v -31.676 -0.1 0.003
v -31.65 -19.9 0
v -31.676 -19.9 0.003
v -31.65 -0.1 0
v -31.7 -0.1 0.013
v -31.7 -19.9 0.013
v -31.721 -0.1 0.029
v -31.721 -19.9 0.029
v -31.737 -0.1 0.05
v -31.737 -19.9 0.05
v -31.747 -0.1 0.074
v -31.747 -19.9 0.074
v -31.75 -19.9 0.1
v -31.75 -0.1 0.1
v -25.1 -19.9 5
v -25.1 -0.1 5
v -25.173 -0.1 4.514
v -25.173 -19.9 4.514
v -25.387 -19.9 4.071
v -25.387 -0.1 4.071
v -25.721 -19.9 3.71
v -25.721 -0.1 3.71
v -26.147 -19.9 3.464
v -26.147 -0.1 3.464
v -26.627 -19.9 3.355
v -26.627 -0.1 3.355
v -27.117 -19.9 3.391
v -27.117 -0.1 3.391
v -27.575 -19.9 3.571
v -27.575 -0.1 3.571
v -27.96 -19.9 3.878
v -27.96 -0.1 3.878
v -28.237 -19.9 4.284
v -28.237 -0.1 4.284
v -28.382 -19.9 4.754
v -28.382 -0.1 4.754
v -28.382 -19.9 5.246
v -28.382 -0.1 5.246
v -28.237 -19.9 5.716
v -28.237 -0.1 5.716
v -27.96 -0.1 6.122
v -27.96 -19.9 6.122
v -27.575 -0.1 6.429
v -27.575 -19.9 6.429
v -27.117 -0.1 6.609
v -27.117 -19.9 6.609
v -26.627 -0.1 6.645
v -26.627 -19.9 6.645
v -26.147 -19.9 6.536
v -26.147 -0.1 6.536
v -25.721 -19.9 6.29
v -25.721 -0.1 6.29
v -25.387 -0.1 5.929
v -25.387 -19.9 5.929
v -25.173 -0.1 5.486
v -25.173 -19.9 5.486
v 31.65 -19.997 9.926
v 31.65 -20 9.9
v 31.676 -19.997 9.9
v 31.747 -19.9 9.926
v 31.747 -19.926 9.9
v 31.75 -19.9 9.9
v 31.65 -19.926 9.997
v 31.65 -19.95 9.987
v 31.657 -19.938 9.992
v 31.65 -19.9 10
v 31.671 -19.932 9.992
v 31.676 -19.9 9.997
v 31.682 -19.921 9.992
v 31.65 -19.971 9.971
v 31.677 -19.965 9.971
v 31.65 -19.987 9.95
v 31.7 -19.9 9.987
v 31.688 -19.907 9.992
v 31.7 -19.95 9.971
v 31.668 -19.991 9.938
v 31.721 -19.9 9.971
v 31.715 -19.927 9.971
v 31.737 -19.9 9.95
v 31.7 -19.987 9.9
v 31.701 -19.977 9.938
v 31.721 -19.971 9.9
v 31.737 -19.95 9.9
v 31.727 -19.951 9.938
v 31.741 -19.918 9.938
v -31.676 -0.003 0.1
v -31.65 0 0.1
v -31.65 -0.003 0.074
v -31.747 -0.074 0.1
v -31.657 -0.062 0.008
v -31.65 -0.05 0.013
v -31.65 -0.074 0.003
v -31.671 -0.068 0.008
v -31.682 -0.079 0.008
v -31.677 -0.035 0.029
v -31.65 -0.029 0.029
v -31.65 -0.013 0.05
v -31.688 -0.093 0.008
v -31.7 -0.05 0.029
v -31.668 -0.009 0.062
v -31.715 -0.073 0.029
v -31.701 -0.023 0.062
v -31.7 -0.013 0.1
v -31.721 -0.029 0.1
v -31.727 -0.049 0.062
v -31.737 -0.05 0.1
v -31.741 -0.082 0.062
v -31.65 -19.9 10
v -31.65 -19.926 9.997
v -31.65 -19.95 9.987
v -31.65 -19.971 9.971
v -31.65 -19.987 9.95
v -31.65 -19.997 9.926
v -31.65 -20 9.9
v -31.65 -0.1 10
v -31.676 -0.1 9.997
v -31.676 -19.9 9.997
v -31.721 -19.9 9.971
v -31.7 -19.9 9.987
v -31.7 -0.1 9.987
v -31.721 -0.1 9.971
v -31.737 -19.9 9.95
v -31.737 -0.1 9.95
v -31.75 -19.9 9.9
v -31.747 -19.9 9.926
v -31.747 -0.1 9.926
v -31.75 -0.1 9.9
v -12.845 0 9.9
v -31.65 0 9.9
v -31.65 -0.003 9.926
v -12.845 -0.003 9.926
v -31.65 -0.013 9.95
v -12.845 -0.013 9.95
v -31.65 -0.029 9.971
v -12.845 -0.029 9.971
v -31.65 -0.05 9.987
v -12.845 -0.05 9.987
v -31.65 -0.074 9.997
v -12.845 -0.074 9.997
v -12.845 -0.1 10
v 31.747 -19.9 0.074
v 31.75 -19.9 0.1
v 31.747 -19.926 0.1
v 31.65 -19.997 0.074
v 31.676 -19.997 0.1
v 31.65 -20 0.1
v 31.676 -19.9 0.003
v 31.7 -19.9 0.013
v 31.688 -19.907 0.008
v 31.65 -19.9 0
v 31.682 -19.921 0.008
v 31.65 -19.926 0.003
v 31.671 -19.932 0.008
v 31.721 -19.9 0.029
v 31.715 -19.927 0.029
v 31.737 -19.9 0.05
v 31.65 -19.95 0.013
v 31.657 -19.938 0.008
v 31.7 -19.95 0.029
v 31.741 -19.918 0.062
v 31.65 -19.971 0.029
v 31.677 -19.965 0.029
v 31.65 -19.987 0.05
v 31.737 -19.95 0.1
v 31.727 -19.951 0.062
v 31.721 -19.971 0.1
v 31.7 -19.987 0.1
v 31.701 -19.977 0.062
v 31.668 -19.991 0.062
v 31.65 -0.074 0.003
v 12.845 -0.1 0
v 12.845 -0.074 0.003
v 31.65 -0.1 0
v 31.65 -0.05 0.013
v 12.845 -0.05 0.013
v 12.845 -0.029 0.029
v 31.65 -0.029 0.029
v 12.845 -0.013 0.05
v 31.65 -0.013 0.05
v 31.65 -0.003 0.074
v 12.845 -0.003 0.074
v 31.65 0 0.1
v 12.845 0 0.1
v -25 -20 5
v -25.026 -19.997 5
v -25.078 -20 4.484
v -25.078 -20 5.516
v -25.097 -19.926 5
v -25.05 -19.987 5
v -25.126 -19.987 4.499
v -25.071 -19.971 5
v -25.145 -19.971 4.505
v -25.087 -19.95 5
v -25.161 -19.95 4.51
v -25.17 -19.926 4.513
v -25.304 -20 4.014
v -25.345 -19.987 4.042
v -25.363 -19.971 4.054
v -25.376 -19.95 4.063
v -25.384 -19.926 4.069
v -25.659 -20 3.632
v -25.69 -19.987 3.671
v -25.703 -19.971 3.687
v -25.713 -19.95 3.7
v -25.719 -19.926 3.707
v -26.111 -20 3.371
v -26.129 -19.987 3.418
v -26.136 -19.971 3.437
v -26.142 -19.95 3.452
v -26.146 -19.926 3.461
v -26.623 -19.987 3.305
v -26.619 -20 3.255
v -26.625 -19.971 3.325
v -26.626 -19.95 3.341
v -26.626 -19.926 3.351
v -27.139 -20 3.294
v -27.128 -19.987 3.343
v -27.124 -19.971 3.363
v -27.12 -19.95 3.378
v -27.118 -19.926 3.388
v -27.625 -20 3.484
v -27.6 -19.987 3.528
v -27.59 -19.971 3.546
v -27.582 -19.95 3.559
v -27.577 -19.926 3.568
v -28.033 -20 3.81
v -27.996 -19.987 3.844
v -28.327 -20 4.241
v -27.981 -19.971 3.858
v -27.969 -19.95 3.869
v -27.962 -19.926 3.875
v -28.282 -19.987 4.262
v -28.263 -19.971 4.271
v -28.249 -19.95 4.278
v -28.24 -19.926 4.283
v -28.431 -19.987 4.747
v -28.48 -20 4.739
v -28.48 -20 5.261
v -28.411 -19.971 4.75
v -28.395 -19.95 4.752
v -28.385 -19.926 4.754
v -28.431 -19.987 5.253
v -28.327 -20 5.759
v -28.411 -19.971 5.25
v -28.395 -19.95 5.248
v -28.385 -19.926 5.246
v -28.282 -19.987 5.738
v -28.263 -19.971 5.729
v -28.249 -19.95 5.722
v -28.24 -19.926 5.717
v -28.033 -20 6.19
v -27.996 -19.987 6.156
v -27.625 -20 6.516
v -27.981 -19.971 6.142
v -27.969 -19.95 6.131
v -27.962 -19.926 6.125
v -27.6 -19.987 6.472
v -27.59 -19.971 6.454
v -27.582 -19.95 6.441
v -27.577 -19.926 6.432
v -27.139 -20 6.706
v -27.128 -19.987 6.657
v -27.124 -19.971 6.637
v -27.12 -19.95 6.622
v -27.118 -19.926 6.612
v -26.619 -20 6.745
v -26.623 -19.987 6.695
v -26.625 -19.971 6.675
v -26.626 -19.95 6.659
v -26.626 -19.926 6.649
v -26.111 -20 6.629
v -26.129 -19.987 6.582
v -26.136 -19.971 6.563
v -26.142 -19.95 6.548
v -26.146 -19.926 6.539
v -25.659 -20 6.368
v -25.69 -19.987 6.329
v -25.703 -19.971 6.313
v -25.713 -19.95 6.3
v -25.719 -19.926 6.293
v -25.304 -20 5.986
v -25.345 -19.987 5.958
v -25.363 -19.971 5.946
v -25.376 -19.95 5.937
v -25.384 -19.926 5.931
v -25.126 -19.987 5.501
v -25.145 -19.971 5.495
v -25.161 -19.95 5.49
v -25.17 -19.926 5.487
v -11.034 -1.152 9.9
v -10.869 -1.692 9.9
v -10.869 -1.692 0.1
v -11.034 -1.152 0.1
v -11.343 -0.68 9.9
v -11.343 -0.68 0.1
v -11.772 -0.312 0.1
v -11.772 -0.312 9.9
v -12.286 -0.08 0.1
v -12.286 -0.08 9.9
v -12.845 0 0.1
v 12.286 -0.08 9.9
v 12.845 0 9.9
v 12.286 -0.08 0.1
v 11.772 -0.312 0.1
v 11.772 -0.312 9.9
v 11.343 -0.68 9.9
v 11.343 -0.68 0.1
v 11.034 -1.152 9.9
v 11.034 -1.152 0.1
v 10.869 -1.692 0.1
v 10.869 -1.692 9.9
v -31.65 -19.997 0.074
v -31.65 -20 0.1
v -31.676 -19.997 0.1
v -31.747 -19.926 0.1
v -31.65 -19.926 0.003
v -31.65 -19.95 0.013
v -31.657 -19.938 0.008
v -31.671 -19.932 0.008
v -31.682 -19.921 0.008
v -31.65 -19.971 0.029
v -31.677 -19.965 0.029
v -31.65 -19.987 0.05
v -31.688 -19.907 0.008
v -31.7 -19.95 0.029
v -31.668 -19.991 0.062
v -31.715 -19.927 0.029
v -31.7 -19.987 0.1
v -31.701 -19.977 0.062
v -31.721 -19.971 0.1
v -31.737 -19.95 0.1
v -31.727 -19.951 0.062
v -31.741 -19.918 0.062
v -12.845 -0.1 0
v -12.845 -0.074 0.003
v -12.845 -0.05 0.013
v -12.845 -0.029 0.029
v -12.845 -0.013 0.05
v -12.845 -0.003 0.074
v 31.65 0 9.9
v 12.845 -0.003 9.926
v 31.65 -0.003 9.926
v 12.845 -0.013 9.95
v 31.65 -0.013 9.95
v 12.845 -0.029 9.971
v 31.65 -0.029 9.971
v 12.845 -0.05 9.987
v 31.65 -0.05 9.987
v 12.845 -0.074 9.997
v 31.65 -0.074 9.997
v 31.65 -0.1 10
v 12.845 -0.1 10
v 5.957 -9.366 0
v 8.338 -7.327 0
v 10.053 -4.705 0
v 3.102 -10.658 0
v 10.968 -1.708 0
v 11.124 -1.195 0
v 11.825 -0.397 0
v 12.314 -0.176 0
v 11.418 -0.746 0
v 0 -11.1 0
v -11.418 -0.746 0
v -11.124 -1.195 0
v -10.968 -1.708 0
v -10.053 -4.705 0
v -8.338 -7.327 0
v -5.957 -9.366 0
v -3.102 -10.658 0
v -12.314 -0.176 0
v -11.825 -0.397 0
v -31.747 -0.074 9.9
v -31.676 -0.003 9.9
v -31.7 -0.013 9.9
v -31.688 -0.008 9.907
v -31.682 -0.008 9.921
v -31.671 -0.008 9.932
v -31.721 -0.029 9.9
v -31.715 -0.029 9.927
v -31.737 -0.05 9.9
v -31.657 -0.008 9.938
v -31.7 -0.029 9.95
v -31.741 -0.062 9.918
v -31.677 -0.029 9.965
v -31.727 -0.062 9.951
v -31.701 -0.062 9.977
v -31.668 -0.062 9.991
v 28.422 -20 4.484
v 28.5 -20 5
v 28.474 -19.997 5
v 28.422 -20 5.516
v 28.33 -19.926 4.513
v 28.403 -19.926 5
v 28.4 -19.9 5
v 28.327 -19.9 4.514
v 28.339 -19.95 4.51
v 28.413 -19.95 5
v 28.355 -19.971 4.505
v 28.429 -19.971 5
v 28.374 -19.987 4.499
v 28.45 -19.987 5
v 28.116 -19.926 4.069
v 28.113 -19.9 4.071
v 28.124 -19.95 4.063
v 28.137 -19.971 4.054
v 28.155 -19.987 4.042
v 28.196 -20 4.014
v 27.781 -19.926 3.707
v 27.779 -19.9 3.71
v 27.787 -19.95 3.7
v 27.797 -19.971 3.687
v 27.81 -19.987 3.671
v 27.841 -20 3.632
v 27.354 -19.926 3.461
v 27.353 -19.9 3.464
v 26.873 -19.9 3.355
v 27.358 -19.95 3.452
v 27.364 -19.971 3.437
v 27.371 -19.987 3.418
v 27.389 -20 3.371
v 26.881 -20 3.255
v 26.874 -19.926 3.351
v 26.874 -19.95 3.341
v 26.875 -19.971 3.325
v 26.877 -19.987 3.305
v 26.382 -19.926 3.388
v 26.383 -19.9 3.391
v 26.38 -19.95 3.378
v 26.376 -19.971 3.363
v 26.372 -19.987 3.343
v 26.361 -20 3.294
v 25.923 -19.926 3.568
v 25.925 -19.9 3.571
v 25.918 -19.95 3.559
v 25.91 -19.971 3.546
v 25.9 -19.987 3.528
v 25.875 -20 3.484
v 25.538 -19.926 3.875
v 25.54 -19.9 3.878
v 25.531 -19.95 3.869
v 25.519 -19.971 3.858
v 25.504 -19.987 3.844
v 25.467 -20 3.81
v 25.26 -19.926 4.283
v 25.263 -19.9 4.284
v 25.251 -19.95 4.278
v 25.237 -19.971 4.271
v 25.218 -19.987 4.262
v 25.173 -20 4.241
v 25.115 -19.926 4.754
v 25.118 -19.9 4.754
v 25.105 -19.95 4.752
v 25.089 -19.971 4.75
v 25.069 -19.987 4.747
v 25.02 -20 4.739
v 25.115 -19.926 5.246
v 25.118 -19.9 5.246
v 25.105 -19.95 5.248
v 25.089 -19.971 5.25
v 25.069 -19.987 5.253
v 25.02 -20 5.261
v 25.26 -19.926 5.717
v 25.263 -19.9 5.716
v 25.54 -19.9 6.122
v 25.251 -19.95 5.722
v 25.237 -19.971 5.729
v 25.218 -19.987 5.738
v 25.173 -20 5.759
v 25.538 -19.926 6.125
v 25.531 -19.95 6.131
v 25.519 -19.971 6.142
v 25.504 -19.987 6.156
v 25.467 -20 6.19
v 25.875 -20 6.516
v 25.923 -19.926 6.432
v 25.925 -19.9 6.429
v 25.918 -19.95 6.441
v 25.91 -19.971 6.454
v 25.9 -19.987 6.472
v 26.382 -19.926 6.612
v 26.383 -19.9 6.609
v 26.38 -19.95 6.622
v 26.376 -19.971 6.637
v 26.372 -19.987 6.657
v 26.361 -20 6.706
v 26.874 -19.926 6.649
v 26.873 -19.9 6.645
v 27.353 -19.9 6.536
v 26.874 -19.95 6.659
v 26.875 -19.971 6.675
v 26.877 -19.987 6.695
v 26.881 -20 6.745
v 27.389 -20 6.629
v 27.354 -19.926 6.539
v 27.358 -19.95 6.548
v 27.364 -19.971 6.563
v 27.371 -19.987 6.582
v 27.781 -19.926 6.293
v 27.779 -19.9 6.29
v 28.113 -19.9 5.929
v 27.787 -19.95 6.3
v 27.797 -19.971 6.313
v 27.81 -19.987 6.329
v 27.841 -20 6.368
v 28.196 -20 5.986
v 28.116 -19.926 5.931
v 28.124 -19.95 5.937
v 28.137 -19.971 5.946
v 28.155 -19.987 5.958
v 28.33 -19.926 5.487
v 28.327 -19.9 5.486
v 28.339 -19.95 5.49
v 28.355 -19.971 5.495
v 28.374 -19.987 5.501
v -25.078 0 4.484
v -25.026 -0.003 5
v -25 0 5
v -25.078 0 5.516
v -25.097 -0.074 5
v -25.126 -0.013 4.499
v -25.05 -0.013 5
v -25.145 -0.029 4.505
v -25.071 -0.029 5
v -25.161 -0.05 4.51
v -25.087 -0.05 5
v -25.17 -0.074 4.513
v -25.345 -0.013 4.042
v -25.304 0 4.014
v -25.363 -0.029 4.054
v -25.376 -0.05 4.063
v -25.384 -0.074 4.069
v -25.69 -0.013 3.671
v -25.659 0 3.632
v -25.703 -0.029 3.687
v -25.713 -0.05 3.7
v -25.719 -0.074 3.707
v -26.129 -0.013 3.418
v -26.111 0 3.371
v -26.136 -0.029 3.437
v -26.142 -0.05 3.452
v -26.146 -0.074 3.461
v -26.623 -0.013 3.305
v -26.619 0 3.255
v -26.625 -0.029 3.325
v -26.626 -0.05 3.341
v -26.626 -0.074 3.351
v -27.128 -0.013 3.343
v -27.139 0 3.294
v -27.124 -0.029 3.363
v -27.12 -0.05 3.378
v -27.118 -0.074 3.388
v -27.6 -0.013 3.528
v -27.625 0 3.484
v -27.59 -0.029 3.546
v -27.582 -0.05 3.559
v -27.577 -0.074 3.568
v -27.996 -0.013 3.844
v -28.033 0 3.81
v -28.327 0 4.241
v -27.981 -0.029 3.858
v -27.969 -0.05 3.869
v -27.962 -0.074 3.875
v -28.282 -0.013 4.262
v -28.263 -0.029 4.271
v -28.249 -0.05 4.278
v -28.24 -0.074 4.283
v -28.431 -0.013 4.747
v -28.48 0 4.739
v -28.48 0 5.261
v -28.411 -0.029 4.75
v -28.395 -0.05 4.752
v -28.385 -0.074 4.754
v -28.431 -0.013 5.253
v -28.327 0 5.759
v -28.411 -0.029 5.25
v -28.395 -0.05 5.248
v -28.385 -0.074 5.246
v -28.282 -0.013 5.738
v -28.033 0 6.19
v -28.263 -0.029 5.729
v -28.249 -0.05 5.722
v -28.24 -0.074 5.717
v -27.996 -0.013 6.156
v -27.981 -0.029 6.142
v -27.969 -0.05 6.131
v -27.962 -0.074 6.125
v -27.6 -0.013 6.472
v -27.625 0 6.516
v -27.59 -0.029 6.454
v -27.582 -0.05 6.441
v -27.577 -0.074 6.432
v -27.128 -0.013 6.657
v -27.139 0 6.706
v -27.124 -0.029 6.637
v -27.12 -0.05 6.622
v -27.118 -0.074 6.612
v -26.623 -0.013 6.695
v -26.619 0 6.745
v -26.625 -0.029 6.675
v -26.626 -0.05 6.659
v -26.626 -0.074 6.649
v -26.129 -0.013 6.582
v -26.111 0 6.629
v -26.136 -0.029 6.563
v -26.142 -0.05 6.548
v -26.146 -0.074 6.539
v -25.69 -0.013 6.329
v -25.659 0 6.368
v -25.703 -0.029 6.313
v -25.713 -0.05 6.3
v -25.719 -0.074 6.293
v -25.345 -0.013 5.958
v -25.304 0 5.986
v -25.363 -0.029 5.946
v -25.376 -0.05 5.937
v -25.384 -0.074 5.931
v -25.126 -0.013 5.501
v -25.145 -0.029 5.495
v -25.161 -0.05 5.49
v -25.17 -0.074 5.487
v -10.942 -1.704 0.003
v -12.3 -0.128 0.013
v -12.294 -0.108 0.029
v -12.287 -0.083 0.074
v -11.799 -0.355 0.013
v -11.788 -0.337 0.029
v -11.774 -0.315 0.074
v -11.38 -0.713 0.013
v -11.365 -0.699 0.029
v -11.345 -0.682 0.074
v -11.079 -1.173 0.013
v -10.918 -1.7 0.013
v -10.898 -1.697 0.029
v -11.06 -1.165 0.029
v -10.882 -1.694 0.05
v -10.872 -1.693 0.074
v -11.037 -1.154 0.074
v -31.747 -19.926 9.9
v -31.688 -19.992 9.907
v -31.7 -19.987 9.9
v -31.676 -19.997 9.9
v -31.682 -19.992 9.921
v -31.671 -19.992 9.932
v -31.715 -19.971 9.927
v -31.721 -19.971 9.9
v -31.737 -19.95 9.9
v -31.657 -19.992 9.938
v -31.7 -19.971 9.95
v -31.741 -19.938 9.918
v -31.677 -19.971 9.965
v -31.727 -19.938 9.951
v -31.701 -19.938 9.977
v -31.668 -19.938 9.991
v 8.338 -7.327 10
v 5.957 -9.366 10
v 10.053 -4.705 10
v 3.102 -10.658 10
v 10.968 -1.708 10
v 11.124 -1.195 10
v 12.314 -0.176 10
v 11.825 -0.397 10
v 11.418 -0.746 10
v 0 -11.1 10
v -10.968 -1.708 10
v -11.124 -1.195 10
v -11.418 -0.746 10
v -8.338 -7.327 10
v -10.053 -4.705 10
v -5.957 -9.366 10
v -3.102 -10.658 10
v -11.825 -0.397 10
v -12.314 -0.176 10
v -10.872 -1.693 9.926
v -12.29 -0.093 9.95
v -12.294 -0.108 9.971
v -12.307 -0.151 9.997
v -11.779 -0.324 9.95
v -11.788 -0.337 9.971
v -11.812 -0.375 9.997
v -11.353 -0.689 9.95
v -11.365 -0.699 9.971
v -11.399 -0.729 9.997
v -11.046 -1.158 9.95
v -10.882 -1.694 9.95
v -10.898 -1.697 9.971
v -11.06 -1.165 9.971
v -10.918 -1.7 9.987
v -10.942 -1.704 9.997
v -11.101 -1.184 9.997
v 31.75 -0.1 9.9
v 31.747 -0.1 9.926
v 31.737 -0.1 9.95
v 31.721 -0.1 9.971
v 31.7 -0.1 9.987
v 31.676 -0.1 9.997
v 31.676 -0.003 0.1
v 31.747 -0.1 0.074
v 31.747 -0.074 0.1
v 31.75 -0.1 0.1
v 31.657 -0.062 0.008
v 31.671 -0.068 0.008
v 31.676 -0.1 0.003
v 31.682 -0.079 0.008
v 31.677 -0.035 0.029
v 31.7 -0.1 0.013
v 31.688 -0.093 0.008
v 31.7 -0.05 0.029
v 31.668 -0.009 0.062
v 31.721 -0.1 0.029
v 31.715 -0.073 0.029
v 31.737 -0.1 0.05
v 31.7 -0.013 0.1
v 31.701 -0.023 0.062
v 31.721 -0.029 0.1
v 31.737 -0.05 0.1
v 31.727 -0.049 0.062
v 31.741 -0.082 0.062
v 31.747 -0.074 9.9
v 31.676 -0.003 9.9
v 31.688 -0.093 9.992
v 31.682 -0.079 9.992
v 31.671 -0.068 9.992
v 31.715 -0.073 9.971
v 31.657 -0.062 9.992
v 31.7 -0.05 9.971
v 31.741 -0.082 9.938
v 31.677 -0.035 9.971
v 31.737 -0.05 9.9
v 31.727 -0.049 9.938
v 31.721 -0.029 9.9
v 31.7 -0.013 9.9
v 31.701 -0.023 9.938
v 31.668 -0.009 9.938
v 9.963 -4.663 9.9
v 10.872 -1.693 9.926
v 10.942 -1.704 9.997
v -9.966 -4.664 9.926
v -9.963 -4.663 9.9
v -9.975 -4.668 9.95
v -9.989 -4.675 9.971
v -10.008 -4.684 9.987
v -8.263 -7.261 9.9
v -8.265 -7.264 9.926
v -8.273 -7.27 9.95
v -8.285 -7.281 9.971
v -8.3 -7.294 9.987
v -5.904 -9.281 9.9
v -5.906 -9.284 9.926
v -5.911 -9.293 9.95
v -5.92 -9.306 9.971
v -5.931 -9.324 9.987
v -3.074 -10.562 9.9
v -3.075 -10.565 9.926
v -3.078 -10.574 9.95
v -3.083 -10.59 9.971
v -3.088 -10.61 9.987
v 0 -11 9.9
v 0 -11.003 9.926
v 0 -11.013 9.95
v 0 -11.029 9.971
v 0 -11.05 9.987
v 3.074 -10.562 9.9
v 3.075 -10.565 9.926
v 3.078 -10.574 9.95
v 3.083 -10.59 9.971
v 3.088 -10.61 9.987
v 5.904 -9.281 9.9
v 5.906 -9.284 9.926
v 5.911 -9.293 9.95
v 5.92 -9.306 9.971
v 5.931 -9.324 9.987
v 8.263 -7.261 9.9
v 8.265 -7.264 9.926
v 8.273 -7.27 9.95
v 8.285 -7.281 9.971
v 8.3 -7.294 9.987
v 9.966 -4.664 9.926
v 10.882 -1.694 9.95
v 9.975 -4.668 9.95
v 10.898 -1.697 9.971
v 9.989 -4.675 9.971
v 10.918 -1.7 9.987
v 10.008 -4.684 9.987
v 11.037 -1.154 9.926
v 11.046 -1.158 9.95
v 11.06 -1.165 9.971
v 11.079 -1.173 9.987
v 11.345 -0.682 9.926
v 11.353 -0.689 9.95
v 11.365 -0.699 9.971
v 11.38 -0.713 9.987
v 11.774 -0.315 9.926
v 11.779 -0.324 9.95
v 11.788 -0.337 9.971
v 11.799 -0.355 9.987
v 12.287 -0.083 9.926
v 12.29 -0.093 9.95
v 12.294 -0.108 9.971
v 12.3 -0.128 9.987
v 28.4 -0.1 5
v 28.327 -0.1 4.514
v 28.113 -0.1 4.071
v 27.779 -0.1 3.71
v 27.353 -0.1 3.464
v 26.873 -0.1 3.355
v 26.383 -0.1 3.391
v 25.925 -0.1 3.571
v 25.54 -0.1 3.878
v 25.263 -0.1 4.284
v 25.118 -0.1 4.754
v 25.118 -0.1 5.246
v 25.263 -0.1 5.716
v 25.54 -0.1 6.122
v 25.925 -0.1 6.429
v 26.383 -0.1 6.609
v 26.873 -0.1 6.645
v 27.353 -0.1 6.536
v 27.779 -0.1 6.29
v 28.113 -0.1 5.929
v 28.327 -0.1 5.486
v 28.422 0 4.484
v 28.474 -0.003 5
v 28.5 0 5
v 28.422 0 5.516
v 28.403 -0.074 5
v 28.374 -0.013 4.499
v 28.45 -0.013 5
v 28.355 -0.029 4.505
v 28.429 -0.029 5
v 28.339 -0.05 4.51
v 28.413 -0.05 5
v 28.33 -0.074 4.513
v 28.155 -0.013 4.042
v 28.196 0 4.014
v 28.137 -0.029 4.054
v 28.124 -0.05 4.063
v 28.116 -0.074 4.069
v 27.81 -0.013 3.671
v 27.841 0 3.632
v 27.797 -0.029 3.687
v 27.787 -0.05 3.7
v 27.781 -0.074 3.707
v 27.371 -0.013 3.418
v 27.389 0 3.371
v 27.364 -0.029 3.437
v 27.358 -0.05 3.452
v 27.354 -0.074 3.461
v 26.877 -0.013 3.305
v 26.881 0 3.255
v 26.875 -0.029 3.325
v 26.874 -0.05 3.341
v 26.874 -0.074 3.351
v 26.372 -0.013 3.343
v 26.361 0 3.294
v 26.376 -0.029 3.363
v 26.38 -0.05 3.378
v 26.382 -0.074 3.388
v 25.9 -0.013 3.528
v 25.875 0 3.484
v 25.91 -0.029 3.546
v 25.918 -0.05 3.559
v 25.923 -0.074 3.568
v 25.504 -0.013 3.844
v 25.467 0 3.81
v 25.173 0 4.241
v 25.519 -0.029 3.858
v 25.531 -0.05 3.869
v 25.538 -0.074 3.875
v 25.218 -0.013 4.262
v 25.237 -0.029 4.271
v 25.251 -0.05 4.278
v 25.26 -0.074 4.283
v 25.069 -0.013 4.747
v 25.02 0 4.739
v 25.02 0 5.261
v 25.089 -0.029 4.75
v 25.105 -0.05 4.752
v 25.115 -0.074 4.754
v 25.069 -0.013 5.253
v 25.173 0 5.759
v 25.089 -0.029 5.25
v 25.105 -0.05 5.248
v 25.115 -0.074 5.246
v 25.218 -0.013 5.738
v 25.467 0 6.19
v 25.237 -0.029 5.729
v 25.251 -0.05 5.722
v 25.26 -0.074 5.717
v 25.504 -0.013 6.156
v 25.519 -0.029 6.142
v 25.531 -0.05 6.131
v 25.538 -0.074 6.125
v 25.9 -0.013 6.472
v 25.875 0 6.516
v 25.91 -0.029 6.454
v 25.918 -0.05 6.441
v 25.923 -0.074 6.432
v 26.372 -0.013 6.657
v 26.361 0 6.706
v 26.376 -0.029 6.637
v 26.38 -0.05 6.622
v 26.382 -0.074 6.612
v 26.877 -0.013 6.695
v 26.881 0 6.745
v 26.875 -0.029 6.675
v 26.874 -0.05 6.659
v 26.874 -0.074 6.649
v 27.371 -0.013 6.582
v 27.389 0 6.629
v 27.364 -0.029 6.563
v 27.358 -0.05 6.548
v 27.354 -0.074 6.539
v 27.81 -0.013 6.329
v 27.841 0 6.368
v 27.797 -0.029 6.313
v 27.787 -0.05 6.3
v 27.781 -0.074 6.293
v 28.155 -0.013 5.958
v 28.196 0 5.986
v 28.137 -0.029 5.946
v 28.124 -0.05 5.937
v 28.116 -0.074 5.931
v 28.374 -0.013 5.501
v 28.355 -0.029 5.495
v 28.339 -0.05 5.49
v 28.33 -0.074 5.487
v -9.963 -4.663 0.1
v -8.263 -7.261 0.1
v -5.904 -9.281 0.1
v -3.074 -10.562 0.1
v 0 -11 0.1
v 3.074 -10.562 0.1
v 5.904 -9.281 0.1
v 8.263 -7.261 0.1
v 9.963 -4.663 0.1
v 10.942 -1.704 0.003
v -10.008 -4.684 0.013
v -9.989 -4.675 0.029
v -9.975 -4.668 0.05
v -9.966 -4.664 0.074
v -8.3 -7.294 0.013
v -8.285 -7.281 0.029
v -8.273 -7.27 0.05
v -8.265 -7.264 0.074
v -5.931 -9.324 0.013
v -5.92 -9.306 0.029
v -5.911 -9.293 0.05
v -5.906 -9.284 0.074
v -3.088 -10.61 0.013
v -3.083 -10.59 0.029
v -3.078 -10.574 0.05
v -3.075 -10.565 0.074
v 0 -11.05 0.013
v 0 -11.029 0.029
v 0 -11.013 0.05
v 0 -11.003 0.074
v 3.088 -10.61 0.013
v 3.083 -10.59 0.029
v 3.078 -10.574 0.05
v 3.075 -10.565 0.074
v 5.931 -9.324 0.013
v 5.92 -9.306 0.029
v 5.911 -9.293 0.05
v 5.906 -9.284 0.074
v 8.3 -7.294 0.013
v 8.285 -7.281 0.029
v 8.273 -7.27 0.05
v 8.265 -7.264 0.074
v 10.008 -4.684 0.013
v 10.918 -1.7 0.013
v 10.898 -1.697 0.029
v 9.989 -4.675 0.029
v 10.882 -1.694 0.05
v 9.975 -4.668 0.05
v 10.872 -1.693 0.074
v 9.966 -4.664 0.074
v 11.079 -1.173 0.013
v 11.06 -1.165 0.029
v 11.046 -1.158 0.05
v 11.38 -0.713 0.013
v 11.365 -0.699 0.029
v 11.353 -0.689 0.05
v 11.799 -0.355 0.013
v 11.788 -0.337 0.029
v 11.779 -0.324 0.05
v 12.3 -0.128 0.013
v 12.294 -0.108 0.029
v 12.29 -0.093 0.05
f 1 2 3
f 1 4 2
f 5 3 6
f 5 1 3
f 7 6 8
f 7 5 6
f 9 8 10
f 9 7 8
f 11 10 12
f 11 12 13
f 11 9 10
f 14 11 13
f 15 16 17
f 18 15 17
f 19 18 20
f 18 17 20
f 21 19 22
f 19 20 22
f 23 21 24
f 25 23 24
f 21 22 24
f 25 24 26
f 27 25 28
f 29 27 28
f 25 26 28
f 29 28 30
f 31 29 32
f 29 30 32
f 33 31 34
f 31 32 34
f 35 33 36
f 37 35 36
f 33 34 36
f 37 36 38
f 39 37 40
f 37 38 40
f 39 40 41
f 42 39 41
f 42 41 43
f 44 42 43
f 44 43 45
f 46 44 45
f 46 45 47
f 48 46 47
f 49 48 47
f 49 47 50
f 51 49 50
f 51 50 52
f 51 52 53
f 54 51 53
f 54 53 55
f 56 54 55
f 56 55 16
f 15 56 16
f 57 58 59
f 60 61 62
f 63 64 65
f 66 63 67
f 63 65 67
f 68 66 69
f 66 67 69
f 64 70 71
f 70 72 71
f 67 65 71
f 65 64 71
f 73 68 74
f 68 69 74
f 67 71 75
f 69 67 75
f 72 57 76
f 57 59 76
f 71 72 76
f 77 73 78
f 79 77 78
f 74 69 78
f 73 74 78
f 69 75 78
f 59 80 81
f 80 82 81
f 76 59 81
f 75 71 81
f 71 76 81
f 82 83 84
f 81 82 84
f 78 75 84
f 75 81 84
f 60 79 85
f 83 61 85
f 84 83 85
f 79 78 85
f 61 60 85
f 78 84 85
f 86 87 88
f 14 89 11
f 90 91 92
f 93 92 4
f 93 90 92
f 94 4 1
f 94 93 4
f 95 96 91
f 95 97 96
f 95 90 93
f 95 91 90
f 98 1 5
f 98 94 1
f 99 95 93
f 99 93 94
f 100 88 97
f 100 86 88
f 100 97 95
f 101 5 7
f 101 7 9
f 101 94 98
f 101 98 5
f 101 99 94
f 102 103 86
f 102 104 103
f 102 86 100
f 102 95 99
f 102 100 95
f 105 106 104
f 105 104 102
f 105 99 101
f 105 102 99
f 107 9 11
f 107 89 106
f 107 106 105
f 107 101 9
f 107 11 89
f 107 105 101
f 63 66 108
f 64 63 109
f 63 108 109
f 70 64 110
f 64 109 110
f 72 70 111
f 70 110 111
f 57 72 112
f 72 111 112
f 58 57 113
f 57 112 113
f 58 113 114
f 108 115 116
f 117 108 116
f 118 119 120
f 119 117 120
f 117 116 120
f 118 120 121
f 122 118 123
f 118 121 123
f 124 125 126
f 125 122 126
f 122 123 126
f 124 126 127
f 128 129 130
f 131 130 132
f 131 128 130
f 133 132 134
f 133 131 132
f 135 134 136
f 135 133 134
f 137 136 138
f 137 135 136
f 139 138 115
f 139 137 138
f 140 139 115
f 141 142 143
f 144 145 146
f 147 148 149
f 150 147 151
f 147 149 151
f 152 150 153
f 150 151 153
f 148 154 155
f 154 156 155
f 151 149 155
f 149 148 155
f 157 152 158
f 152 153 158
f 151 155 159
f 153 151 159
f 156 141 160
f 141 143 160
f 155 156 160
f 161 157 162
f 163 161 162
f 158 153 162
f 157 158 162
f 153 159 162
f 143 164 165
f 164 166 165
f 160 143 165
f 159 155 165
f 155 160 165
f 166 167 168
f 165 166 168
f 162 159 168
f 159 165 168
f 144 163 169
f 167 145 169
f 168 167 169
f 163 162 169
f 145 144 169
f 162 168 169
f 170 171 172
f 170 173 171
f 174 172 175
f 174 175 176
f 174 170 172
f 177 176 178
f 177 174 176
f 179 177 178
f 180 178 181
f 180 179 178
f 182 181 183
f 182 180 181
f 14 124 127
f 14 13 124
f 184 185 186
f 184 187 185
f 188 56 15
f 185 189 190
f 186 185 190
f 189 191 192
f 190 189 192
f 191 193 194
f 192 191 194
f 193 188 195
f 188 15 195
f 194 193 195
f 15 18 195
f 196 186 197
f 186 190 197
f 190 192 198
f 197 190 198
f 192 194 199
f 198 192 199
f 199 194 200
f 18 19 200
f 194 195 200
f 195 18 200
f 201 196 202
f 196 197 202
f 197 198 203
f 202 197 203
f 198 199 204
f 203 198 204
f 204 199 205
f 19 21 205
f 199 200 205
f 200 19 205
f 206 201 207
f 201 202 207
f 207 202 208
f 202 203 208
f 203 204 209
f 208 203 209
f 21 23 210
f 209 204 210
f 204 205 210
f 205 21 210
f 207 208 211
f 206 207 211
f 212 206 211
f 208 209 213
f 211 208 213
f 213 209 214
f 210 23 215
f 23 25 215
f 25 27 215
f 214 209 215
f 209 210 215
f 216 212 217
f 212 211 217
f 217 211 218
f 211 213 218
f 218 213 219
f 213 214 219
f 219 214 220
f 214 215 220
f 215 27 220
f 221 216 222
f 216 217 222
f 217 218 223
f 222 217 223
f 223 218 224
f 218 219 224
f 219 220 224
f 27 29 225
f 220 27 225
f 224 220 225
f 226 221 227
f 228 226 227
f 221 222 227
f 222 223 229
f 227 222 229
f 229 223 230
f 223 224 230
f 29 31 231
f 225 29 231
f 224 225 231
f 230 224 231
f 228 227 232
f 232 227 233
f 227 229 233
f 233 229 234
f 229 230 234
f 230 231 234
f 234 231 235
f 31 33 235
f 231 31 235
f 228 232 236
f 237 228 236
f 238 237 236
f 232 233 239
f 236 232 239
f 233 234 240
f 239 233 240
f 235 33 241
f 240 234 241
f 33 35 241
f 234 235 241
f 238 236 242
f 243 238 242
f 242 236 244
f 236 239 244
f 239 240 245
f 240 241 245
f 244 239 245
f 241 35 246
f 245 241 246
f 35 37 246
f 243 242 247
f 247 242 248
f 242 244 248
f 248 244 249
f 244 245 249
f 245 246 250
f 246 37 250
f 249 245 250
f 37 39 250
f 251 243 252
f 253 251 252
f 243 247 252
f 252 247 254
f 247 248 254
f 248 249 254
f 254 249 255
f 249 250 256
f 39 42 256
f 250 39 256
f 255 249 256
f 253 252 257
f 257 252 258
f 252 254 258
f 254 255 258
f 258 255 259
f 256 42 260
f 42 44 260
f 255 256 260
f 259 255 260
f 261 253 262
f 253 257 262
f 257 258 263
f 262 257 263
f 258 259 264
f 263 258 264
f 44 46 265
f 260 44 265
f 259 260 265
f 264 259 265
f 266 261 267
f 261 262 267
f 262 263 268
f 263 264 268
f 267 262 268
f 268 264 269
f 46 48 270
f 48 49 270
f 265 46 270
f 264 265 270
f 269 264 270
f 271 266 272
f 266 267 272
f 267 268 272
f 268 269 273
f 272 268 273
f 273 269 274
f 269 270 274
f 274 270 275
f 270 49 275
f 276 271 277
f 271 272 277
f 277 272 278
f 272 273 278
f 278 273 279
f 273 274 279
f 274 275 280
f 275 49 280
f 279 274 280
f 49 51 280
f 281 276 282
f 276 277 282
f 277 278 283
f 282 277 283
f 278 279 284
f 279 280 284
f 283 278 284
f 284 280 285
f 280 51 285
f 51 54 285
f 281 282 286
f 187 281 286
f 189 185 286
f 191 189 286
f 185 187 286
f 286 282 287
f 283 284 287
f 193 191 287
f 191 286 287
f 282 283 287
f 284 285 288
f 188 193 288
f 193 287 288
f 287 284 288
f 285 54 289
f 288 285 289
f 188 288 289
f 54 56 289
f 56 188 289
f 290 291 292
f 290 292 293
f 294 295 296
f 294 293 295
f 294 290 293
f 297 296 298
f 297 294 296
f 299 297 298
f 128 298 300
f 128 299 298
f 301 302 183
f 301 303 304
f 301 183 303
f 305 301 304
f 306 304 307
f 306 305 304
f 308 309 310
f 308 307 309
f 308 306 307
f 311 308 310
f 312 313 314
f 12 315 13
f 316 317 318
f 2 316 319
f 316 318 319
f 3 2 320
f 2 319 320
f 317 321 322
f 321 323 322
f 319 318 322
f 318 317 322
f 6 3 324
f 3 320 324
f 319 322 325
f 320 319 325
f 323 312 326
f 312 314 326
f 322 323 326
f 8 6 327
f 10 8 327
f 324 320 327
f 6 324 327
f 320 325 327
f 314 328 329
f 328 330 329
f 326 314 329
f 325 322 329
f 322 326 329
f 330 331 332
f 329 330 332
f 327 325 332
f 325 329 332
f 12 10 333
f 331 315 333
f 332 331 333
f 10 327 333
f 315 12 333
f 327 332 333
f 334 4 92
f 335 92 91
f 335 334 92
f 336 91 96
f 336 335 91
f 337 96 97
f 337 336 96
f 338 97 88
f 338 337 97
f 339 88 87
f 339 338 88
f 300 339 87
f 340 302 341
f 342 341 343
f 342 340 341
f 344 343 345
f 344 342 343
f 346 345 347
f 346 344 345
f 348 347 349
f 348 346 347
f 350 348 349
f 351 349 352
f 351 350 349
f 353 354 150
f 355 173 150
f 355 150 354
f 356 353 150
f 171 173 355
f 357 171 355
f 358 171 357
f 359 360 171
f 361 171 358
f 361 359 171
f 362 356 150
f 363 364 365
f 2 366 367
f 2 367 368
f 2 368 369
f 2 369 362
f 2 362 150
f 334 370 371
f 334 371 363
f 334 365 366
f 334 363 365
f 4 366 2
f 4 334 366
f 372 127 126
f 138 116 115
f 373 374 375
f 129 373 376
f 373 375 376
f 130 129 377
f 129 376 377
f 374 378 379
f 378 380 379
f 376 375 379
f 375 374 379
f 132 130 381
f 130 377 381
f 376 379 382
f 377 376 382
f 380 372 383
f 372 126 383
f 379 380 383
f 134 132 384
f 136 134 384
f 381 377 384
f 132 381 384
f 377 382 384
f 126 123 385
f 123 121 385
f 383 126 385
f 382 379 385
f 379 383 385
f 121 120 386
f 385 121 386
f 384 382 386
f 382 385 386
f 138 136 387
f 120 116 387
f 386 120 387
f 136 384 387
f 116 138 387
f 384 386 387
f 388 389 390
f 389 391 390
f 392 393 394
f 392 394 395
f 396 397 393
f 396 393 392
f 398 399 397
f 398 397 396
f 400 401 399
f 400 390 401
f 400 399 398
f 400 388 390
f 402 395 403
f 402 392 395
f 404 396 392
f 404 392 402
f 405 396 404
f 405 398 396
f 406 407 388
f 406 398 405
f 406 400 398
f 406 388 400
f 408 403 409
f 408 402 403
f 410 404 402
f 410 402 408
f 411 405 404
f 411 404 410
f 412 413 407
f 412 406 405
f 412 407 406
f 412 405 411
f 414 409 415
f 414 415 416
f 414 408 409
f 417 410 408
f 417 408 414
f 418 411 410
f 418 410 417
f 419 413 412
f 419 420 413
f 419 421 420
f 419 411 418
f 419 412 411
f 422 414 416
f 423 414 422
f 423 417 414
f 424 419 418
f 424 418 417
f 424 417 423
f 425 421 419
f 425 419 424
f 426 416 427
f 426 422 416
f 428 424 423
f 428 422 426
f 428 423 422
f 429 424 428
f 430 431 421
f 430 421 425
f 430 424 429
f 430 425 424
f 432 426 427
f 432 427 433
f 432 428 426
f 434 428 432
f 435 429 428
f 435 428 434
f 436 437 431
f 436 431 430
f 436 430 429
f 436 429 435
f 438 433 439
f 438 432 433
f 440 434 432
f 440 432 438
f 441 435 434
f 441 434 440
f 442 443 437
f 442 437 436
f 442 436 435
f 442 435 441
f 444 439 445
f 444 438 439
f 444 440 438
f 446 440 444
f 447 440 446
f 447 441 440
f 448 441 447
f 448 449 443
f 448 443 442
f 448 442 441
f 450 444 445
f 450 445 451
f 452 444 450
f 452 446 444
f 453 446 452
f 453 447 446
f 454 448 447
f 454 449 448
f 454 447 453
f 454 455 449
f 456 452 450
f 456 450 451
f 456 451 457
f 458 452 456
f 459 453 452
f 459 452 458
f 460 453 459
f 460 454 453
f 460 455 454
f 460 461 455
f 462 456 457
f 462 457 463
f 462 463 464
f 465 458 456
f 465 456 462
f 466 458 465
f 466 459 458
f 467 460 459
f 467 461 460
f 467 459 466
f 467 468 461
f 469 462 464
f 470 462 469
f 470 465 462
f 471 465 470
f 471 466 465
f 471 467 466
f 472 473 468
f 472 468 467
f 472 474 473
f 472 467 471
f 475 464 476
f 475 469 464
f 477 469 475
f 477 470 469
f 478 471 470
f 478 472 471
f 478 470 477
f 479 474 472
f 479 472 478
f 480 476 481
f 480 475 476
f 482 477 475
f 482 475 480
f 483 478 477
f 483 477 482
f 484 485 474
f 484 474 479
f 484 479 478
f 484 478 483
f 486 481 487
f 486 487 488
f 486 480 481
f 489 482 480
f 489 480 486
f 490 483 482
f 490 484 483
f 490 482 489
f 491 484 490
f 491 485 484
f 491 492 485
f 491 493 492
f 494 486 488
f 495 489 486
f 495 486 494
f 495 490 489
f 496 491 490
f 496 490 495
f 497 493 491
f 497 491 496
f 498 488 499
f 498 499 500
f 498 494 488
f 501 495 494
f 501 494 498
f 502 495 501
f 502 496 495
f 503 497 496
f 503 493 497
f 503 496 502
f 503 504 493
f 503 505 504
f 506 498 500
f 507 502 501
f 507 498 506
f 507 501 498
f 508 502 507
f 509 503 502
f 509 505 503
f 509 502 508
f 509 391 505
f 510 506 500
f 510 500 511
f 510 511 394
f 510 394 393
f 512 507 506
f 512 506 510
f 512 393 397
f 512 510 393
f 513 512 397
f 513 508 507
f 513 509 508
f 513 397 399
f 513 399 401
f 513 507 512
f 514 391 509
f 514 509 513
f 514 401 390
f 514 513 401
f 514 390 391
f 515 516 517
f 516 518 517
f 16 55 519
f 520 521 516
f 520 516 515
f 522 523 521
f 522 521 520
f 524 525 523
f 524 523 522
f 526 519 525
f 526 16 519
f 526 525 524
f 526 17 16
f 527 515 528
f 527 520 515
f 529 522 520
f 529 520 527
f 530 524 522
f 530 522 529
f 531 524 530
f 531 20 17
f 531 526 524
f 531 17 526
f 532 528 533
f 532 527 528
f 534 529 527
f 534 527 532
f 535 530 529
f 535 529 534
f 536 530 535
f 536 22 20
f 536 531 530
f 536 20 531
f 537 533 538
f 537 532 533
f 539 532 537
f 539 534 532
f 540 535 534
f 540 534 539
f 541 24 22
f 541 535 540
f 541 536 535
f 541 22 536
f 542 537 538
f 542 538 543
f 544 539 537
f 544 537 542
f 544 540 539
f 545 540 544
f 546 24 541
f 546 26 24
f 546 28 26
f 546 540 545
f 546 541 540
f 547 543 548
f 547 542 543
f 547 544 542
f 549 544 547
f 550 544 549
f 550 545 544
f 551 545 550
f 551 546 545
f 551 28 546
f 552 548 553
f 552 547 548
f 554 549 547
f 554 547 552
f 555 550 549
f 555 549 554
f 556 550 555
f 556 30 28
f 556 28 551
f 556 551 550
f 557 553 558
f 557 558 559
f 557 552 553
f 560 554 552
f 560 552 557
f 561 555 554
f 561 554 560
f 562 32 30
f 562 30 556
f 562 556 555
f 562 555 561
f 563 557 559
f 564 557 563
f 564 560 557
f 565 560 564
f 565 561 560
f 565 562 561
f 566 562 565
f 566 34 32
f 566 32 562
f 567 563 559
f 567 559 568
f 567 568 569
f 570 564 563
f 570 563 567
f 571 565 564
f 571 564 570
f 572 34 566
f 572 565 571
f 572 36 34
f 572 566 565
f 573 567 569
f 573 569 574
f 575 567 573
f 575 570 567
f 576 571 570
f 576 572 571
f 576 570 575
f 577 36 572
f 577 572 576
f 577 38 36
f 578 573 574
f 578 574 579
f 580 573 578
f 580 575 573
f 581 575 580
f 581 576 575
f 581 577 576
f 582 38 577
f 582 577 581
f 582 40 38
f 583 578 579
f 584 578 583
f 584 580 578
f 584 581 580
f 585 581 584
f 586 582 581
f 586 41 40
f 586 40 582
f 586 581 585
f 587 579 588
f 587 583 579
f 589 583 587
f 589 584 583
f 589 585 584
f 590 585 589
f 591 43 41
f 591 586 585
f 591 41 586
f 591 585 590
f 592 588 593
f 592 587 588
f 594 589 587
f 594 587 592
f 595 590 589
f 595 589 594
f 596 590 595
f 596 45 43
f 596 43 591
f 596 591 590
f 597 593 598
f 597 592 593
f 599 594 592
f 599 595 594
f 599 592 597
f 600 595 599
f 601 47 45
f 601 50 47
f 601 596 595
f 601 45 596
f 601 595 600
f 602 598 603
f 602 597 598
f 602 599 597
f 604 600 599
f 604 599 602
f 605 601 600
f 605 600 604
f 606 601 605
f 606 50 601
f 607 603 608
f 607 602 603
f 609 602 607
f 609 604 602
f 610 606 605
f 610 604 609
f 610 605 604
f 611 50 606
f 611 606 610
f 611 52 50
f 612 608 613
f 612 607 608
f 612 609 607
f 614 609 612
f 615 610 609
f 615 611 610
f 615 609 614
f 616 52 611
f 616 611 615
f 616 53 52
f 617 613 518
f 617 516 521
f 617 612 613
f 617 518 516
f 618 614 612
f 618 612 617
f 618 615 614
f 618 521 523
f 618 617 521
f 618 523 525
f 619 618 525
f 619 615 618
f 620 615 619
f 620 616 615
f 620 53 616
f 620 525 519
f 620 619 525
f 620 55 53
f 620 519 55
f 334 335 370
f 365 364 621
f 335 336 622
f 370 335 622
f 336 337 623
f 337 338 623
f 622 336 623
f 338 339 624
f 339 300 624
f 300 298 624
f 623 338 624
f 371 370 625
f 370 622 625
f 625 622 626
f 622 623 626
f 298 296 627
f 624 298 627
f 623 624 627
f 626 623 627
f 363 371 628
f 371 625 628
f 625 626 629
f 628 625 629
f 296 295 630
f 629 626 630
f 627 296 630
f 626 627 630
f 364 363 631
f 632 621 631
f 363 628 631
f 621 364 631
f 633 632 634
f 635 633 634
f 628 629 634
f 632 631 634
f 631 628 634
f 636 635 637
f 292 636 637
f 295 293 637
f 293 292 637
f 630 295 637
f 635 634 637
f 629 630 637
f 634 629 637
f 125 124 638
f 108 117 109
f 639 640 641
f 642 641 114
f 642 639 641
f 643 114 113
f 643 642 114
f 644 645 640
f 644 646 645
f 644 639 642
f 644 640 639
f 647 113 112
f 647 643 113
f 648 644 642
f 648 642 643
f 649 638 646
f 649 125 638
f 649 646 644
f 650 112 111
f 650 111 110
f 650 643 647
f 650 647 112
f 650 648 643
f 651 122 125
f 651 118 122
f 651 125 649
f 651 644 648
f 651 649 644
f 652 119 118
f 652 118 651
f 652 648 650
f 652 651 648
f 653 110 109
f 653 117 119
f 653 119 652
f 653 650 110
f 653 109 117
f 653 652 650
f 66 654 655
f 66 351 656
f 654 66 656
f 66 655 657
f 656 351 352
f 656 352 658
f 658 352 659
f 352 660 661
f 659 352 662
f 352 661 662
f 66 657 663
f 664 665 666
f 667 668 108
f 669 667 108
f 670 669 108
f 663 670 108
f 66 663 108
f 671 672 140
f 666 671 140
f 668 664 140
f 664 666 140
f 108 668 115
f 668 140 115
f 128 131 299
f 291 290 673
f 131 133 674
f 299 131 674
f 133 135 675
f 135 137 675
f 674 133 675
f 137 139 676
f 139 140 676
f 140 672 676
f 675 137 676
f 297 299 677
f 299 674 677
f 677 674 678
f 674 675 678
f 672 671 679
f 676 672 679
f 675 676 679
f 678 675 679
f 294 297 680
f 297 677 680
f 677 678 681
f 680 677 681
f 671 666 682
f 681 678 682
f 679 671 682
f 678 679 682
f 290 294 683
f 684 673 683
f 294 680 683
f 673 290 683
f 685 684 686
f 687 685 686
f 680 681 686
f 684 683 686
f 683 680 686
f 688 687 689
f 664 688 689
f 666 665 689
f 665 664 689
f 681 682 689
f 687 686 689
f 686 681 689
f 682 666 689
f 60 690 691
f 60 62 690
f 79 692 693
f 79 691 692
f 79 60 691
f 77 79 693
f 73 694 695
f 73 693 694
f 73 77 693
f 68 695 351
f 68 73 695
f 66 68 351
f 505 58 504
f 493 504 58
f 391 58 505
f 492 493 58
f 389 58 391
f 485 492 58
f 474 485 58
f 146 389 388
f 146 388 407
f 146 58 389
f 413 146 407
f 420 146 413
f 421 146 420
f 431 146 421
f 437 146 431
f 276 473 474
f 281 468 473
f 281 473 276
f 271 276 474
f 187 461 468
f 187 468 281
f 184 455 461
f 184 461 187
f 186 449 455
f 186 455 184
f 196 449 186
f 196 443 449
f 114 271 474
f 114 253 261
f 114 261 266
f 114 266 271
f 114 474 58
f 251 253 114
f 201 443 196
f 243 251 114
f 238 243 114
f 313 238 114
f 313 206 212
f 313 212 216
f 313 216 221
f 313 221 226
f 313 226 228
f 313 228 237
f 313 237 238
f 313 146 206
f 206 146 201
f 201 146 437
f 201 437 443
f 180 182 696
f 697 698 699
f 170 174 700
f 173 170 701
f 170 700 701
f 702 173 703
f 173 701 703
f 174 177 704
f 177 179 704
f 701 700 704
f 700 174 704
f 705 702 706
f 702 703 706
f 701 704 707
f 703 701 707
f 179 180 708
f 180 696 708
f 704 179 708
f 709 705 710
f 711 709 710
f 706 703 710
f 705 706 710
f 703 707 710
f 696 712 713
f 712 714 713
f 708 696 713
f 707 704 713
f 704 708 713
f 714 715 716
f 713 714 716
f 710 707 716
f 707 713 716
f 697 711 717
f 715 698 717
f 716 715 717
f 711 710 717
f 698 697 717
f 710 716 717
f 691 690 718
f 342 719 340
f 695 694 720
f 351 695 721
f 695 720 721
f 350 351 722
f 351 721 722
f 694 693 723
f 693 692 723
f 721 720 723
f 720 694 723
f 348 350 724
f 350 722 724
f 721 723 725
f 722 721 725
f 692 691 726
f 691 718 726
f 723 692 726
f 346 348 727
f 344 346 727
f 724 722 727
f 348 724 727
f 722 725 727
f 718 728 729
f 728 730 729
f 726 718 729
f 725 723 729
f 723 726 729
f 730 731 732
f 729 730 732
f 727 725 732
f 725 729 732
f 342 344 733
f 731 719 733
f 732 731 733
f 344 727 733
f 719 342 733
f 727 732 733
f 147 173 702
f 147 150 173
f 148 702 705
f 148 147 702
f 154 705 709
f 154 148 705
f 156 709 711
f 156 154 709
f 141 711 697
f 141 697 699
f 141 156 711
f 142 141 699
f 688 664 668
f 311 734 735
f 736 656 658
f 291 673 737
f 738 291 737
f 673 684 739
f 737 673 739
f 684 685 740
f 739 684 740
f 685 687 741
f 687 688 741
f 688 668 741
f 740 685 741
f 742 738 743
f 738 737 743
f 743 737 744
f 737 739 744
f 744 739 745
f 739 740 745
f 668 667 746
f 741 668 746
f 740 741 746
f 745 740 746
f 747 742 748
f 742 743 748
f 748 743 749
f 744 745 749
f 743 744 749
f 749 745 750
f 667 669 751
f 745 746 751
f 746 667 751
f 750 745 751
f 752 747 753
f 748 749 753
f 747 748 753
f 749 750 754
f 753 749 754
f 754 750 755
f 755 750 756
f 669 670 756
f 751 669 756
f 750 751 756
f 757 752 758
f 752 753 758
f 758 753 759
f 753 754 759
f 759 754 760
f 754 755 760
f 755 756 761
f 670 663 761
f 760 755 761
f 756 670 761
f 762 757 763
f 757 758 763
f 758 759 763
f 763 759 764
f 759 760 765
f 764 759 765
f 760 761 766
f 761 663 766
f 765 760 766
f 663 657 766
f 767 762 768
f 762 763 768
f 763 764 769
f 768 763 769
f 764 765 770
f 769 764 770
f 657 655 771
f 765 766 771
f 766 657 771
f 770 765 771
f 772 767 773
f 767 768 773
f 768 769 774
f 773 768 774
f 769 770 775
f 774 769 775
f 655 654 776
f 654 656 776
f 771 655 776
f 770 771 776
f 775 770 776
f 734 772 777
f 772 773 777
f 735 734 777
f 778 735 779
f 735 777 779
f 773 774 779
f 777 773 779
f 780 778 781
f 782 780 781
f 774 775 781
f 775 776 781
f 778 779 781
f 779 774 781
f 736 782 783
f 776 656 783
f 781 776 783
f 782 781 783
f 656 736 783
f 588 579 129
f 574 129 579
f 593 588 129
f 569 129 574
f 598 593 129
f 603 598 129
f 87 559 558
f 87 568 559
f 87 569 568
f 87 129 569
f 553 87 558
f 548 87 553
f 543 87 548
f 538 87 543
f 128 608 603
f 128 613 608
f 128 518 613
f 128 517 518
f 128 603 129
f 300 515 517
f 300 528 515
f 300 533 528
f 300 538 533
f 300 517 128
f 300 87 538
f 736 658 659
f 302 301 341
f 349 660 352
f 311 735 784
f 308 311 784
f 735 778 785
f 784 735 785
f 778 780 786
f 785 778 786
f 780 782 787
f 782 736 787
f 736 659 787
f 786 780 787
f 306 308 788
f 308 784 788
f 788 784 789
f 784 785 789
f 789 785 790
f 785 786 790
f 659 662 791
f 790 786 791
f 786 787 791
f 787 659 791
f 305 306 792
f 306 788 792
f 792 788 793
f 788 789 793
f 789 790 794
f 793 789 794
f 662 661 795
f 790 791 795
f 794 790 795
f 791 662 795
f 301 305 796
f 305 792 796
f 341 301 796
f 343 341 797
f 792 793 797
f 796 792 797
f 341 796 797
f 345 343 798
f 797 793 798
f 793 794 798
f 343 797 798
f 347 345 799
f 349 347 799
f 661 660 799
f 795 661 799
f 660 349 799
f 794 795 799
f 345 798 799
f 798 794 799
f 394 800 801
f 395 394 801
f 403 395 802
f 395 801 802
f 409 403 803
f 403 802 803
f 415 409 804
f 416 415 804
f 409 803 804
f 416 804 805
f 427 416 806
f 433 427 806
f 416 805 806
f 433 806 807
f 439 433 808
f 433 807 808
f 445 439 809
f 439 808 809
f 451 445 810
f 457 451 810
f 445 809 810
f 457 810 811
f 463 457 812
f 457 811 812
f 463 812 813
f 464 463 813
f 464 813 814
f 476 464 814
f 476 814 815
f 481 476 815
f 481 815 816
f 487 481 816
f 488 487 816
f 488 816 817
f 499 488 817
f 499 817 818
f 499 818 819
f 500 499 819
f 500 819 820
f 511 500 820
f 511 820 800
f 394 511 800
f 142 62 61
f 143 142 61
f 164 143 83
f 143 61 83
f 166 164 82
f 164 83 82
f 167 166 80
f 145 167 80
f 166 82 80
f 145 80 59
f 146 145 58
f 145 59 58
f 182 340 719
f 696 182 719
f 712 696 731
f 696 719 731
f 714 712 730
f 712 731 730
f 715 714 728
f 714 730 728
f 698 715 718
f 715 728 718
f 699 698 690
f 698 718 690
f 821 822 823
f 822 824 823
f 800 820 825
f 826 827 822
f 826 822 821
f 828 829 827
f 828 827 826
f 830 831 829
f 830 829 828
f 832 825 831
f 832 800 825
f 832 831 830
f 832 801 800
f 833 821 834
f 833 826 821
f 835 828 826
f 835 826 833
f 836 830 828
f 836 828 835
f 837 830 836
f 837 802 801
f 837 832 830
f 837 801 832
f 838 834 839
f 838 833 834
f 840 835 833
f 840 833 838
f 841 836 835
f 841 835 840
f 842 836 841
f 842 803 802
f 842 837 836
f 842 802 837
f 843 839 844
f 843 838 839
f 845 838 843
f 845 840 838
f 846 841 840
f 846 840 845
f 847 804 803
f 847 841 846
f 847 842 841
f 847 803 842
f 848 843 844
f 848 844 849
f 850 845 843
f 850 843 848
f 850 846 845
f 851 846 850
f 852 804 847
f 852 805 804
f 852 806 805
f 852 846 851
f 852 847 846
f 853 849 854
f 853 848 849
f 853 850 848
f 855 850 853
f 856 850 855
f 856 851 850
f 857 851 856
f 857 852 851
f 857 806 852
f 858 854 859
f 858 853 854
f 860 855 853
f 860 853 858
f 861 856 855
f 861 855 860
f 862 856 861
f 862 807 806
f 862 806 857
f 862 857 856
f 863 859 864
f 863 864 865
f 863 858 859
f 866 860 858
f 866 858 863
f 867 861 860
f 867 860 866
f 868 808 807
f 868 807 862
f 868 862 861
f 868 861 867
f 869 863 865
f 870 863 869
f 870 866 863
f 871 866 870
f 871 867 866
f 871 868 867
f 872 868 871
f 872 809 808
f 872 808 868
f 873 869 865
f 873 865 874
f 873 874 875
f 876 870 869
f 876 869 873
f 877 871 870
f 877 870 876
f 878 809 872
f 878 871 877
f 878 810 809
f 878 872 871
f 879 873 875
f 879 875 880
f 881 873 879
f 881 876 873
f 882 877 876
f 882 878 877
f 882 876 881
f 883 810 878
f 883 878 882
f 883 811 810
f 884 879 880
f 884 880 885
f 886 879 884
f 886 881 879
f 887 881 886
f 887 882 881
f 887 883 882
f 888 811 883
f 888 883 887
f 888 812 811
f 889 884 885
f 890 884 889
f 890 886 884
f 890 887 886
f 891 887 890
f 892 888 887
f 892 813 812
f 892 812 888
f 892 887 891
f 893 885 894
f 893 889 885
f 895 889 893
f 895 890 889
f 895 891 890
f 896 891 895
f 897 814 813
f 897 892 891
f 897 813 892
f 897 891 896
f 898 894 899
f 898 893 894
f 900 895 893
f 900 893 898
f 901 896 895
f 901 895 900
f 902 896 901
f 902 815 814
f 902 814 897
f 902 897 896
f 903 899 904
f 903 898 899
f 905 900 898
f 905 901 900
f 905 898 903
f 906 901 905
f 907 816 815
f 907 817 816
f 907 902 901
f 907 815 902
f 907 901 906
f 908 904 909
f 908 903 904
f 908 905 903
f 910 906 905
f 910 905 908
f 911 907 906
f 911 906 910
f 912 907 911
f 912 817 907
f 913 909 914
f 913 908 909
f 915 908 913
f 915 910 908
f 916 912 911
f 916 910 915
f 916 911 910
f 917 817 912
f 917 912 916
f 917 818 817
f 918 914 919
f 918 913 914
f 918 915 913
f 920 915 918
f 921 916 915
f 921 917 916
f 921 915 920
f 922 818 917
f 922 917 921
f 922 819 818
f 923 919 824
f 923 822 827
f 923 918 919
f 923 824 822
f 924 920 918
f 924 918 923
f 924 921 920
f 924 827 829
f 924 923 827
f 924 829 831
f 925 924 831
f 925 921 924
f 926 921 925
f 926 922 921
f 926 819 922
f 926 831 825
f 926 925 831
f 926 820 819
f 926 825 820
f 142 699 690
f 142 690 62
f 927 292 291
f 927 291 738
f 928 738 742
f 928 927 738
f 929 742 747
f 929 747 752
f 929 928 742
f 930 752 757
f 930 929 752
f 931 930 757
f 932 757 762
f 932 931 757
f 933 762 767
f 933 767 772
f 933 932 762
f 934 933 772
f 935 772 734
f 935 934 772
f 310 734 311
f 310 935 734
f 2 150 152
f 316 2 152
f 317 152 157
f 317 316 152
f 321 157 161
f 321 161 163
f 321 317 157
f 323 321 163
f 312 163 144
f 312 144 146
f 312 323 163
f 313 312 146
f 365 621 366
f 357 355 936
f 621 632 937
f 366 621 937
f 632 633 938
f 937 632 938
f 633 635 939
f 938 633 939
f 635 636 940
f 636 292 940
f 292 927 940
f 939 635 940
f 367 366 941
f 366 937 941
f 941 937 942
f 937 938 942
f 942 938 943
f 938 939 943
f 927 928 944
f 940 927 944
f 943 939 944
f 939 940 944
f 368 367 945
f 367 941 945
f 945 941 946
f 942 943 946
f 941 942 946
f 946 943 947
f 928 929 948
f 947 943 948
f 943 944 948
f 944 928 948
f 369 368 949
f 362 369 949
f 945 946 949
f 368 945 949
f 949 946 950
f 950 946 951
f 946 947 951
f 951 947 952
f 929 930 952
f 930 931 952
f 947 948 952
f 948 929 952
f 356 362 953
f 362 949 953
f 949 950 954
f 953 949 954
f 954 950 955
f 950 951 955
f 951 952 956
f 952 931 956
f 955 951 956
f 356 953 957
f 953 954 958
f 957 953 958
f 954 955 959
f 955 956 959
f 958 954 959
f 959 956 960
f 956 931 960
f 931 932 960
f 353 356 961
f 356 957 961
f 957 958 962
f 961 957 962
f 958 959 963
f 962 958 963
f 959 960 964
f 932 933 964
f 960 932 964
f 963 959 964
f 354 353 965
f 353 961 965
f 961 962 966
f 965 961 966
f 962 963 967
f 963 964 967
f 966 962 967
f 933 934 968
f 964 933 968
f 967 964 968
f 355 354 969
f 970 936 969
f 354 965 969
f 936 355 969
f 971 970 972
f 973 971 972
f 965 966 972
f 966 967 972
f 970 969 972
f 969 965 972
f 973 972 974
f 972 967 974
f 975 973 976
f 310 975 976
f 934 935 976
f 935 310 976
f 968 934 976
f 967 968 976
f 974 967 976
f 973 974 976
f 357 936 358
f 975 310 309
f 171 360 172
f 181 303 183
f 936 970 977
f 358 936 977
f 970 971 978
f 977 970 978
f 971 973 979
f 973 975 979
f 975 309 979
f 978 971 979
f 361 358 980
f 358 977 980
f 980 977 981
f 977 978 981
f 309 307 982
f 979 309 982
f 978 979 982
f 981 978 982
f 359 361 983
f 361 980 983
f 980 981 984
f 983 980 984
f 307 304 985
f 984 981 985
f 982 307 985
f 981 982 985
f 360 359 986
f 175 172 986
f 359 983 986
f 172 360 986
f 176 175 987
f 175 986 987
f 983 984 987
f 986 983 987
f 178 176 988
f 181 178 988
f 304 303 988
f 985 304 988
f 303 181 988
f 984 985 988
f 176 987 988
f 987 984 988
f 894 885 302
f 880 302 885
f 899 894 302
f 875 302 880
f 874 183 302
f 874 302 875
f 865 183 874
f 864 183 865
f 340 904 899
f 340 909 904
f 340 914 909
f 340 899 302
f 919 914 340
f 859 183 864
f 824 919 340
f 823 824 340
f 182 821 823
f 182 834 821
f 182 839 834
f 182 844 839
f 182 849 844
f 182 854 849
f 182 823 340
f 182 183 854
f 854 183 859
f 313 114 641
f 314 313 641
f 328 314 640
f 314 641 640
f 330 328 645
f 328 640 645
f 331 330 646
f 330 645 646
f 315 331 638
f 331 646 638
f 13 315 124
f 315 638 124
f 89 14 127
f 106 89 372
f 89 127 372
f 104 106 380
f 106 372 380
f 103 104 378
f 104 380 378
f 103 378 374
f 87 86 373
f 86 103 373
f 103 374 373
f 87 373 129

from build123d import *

# Parameters (mm, degrees)
EXTRUDE_1_DEPTH = 10
M4X0_71_D       = 3.3
FILLET_2_R      = 2
FILLET_1_R      = 0.1


with BuildPart() as part:
    # Эскиз1 → Бобышка-Вытянуть1 (new body)
    with BuildSketch(Plane.XY):
        with BuildLine():
            Line((11, 0), (31.75, 0))
            Line((31.75, 0), (31.75, -20))
            Line((31.75, -20), (-31.75, -20))
            Line((-31.75, -20), (-31.75, 0))
            Line((-31.75, 0), (-11, 0))
            ThreePointArc((-11, 0), (0, -11), (11, 0))
        make_face()
    extrude(amount=EXTRUDE_1_DEPTH)

    # Отверстие обработанное метчиком M4x0.71 (through all)
    with Locations(Plane(origin=(0, -20, 0), x_dir=(-1, 0, 0), z_dir=(0, -1, 0))):
        with Locations((26.75, -5), (-26.75, -5)):
            Hole(M4X0_71_D / 2)

    # Скругление2
    fillet_2_edges = [part.edges().sort_by_distance(p)[0] for p in [
        (11, 0, 5),
        (-11, 0, 5),
    ]]
    fillet(fillet_2_edges, radius=FILLET_2_R)

    # Скругление1
    fillet_1_edges = [part.edges().sort_by_distance(p)[0] for p in [
        (-31.75, -10, 10),
        (31.75, 0, 5),
        (31.75, -20, 5),
        (-31.75, -20, 5),
        (-31.75, 0, 5),
        (0, -20, 10),
        (31.75, -10, 10),
        (22.297616289, 0, 10),
        (25.1, -20, 5),
        (25.1, 0, 5),
        (-28.4, -20, 5),
        (-28.4, 0, 5),
        (0, -11, 0),
        (0, -11, 10),
        (-22.297616289, 0, 0),
        (-11.544345307, -0.480890949, 0),
        (11.544345307, -0.480890949, 0),
        (-22.297616289, 0, 10),
        (-11.544345307, -0.480890949, 10),
        (11.544345307, -0.480890949, 10),
        (22.297616289, 0, 0),
        (31.75, -10, 0),
        (0, -20, 0),
        (-31.75, -10, 0),
    ]]
    fillet(fillet_1_edges, radius=FILLET_1_R)


solid = part.part
